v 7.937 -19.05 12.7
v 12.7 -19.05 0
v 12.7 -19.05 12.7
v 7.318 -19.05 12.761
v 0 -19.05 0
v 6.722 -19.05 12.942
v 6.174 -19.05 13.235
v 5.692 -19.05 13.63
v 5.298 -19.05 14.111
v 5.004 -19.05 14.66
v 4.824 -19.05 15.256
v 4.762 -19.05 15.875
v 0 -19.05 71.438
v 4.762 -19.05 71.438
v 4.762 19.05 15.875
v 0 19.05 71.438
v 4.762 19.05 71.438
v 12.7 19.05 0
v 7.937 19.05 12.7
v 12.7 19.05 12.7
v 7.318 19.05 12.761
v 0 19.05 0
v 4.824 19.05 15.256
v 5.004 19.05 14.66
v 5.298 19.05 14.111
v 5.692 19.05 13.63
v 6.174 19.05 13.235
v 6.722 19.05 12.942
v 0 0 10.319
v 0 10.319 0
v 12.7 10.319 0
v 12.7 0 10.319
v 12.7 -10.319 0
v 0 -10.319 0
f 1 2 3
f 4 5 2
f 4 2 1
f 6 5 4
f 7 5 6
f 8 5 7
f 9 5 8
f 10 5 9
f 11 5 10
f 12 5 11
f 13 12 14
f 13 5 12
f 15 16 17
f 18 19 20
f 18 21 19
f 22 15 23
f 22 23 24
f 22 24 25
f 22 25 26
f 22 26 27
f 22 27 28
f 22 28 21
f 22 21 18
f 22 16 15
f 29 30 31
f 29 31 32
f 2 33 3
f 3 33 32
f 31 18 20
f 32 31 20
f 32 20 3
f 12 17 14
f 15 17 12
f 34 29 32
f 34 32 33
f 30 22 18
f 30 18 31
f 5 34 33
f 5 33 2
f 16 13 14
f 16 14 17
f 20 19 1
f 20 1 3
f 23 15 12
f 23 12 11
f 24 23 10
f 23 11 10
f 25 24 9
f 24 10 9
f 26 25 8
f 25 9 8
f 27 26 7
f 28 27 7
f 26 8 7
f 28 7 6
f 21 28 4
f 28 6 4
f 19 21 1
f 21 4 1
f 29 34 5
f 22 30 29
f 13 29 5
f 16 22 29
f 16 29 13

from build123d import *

# Parameters (mm, degrees)
BOSS_EXTRUDE1_DEPTH = 12.7
SKETCH2_W           = 7.9375
SKETCH2_H           = 58.7375
CUT_EXTRUDE1_DEPTH  = 39.1
FILLET1_R           = 3.175


with BuildPart() as part:
    # Sketch1 → Boss-Extrude1 (new body)
    with BuildSketch(Plane(origin=(0, 0, 0), x_dir=(0, 0, -1), z_dir=(1, 0, 0))):
        Polygon((0, -10.31875), (0, -19.05), (-71.4375, -19.05), (-71.4375, 19.05), (0, 19.05), (0, 10.31875), (-10.31875, 0), align=None)
    extrude(amount=BOSS_EXTRUDE1_DEPTH)

    # Sketch2 → Cut-Extrude1 (cut, through all)
    with BuildSketch(Plane(origin=(0, 19.05, 0), x_dir=(1, 0, 0), z_dir=(0, 1, 0))):
        with Locations((8.73125, -42.06875)):
            Rectangle(SKETCH2_W, SKETCH2_H)
    extrude(amount=-CUT_EXTRUDE1_DEPTH, mode=Mode.SUBTRACT)

    # Fillet1
    fillet1_edges = [part.edges().sort_by_distance(p)[0] for p in [
        (4.7625, 0, 12.7),
    ]]
    fillet(fillet1_edges, radius=FILLET1_R)


solid = part.part
